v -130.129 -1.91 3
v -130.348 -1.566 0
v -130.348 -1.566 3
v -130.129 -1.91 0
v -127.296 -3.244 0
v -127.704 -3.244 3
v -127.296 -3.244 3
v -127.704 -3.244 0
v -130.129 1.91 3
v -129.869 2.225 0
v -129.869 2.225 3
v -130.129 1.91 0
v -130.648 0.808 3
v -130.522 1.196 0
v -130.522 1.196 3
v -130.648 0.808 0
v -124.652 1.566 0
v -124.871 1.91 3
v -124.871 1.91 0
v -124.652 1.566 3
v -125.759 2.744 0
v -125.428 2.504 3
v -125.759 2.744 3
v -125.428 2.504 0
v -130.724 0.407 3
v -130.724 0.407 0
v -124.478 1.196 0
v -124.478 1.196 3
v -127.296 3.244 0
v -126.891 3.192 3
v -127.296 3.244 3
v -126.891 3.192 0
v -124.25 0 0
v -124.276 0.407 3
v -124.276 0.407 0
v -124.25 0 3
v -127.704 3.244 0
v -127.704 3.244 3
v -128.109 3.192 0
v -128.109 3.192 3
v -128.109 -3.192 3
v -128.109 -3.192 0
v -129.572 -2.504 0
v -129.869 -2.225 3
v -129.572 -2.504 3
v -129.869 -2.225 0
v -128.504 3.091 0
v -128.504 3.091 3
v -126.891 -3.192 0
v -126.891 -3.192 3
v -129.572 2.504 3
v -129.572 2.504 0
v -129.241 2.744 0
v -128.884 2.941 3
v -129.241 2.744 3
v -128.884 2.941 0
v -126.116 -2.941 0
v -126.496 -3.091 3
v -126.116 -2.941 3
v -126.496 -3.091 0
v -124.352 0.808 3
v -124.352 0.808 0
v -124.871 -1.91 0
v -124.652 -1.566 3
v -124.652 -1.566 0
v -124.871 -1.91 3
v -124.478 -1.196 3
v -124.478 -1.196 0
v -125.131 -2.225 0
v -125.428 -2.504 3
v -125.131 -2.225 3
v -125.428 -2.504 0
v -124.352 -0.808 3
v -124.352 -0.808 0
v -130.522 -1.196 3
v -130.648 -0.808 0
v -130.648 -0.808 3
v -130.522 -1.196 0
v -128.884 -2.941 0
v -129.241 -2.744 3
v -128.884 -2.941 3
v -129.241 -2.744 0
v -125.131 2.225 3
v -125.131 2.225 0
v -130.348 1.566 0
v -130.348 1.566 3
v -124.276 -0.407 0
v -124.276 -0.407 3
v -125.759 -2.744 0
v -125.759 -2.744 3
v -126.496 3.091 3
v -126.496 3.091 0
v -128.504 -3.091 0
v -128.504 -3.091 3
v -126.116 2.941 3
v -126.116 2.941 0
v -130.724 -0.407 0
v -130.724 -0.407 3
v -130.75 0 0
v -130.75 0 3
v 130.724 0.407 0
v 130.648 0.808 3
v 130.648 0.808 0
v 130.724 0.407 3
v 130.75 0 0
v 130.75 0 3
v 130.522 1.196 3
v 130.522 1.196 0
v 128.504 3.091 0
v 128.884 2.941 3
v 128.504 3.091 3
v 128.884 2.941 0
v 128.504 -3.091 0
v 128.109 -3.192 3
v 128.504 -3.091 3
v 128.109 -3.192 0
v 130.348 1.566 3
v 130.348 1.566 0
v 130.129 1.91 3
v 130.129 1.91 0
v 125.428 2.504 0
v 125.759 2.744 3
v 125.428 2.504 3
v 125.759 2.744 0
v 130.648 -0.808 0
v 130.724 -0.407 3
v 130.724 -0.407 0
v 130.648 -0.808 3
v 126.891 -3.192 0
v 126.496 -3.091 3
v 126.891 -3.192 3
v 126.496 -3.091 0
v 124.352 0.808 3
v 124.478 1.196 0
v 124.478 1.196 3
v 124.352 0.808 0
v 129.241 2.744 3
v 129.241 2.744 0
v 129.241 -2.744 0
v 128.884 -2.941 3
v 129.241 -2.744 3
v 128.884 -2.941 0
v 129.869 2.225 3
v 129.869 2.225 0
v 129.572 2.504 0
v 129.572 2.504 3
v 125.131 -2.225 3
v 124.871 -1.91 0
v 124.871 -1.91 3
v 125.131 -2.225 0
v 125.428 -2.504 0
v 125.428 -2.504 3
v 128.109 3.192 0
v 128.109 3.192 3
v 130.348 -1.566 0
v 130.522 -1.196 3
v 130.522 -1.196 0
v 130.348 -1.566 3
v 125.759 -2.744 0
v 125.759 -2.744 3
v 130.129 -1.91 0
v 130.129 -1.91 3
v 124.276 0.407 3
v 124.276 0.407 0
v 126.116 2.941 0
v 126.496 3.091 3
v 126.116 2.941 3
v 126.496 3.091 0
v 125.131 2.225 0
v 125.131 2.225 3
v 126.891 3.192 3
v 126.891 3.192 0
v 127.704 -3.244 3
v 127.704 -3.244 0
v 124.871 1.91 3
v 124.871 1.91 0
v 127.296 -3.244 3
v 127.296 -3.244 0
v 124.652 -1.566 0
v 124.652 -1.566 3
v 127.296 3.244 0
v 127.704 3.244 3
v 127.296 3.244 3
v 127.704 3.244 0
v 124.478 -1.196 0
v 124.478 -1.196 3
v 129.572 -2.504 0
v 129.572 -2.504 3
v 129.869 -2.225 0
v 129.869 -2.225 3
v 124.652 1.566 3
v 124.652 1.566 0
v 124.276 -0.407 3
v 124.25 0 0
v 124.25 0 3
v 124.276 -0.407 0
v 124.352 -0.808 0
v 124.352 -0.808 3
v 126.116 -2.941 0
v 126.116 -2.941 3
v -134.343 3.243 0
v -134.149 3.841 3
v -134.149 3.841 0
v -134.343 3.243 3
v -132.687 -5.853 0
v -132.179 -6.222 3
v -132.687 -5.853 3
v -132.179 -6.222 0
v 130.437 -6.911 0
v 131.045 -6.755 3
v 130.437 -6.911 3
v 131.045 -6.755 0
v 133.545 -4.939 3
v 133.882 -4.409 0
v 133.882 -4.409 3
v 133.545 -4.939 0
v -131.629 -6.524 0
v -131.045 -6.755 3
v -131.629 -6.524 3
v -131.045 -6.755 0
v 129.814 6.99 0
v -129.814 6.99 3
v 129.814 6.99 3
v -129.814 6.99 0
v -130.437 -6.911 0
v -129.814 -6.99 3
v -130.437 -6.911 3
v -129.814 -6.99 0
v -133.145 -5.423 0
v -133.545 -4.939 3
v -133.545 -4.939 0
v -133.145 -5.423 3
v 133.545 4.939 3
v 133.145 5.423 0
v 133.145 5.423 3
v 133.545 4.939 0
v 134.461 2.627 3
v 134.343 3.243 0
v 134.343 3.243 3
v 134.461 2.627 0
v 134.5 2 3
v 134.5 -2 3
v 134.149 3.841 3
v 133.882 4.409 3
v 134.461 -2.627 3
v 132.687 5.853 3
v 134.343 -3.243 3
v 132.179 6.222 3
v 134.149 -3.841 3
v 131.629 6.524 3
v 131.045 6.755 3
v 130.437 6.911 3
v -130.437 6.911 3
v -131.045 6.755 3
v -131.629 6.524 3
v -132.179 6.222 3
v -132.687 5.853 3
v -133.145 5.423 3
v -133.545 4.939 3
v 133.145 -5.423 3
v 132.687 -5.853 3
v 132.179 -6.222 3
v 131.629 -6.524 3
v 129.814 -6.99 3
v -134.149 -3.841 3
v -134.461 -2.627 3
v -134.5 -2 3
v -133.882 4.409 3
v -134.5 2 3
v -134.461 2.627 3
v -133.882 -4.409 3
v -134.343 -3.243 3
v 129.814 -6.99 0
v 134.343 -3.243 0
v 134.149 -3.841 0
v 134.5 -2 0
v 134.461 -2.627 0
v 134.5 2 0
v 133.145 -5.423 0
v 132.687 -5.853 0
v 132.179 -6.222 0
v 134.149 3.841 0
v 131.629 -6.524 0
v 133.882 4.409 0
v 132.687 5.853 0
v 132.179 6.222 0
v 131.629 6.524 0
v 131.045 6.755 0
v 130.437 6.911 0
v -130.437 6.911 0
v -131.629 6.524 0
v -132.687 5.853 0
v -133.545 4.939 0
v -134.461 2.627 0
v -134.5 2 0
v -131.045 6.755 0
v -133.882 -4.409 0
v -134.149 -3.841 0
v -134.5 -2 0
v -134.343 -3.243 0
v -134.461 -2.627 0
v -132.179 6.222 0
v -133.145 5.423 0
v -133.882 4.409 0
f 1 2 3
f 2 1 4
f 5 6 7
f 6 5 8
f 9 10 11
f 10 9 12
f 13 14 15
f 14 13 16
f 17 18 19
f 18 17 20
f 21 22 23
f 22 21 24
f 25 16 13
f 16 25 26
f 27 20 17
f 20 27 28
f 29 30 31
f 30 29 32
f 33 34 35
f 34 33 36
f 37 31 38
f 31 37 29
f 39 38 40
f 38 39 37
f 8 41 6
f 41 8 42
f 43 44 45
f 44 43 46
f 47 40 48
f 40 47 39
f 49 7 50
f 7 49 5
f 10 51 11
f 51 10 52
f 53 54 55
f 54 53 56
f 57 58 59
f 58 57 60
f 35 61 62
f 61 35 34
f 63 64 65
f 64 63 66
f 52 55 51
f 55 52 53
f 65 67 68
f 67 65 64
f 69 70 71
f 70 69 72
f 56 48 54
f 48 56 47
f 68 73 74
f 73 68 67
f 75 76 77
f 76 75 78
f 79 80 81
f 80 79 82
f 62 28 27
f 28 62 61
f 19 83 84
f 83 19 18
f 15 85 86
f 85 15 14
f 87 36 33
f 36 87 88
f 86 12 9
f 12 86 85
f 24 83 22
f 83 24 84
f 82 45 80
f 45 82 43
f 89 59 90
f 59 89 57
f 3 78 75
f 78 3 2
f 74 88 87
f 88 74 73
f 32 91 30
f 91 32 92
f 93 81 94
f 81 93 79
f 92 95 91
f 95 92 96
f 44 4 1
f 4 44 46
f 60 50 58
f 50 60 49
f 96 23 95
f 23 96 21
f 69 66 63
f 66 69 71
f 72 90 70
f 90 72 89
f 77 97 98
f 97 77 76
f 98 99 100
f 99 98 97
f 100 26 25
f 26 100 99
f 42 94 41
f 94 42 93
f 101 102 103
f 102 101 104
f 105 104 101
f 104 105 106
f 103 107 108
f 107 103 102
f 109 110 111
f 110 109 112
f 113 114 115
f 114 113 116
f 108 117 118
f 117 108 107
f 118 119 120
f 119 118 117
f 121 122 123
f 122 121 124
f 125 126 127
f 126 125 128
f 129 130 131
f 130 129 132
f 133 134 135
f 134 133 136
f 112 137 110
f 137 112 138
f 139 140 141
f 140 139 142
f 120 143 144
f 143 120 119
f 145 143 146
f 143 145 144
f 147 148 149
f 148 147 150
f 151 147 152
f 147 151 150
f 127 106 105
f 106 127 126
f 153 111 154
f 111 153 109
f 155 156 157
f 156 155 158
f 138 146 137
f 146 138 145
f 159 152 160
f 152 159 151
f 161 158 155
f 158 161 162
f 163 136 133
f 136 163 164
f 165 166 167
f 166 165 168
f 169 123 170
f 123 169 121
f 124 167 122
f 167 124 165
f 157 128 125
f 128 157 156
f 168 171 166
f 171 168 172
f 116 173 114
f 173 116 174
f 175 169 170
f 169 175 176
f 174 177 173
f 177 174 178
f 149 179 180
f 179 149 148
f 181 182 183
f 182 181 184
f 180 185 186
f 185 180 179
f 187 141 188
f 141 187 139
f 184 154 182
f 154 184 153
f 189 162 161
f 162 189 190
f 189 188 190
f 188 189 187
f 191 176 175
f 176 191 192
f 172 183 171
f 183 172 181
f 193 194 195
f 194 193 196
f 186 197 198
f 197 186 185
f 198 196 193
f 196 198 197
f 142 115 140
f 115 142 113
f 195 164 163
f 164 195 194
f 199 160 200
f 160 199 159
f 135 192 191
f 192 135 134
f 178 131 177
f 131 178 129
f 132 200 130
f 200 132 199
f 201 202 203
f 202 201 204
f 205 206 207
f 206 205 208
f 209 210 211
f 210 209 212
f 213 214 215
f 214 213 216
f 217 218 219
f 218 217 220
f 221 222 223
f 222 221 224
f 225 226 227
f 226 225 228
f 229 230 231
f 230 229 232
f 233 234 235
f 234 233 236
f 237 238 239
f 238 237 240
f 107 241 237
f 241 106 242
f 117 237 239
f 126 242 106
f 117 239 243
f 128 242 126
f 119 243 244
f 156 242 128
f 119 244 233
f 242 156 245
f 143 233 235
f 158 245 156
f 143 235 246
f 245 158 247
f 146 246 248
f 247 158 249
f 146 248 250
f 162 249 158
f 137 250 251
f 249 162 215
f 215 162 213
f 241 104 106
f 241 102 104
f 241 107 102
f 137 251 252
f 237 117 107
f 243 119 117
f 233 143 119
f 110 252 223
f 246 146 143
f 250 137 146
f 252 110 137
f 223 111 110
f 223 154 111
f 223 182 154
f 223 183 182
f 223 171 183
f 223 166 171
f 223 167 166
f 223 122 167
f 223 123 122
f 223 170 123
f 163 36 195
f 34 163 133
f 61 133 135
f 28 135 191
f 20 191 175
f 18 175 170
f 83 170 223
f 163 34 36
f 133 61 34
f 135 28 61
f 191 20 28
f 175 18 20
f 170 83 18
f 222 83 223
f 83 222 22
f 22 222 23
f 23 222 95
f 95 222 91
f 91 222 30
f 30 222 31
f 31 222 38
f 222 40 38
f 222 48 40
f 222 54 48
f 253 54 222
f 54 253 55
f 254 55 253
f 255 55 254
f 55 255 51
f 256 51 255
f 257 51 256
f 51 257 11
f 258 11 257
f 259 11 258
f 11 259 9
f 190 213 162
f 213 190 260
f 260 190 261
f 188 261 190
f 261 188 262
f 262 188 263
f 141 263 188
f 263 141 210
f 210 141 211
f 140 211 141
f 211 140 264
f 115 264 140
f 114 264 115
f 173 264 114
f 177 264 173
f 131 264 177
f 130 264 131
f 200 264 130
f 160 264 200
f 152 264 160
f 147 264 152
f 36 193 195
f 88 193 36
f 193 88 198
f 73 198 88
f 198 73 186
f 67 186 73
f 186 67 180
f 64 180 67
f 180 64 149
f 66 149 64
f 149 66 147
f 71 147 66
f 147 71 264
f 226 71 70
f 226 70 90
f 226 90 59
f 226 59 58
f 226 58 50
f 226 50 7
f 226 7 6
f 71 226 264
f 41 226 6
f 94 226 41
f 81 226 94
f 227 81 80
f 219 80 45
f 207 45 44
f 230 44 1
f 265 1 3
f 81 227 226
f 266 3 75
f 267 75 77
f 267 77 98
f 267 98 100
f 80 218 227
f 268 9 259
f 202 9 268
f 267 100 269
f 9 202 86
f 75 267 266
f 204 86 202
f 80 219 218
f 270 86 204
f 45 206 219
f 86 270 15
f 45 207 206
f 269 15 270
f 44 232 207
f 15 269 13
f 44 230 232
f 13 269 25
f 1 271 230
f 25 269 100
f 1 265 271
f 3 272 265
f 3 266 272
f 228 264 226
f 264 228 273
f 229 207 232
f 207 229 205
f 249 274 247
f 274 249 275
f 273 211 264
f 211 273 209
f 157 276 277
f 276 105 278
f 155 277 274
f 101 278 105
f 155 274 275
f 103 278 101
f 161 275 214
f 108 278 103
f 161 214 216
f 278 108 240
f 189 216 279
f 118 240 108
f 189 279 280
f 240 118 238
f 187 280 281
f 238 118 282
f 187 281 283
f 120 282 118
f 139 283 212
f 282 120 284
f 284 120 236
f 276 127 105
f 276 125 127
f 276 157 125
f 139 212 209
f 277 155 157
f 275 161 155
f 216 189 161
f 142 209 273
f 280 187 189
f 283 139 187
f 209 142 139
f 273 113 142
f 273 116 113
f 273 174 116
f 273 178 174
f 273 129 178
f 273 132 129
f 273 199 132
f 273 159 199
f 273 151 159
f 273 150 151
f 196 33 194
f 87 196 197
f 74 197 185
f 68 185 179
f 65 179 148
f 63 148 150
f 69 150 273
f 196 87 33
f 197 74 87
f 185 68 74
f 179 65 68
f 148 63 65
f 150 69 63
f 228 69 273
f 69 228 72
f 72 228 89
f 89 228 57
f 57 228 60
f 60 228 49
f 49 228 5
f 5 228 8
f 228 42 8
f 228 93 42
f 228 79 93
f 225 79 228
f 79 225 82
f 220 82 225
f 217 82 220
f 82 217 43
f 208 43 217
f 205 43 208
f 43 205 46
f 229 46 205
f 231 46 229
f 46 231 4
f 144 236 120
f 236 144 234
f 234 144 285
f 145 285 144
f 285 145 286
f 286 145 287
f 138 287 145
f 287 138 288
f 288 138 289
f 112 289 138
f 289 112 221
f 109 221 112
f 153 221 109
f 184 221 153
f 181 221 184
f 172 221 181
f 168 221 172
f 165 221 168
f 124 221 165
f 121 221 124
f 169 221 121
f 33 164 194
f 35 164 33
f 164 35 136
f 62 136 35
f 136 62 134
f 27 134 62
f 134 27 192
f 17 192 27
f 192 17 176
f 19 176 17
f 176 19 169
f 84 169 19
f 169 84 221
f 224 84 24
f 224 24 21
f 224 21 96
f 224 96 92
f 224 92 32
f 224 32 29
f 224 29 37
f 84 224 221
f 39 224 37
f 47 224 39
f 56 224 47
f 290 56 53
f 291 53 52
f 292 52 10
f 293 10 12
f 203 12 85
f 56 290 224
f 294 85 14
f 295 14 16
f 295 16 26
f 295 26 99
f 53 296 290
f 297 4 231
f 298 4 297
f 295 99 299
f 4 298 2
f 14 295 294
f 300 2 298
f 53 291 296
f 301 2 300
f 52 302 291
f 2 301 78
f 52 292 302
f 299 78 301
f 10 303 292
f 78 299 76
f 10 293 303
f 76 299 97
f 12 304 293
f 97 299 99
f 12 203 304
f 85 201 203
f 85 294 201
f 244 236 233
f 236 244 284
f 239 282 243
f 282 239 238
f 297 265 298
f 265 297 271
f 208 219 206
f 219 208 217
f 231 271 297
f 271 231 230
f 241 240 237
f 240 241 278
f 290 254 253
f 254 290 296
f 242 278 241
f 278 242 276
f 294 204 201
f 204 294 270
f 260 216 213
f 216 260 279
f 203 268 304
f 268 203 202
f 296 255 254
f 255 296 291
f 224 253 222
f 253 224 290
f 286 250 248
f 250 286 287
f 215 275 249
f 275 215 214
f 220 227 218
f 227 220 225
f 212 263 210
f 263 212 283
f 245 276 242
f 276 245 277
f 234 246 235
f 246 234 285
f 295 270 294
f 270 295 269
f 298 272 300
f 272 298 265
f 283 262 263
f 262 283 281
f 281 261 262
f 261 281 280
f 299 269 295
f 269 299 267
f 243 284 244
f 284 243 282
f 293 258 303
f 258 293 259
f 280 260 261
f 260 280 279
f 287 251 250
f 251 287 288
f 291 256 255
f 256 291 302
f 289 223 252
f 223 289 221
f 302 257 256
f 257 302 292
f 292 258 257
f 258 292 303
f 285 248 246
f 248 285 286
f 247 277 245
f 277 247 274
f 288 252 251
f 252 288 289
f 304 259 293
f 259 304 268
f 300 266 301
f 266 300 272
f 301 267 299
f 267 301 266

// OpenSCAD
$fn = 50;


difference() {
	union() {
		hull() {
			translate(v = [-129.5000000000, 2.0000000000, 0]) {
				cylinder(h = 3, r = 5);
			}
			translate(v = [129.5000000000, 2.0000000000, 0]) {
				cylinder(h = 3, r = 5);
			}
			translate(v = [-129.5000000000, -2.0000000000, 0]) {
				cylinder(h = 3, r = 5);
			}
			translate(v = [129.5000000000, -2.0000000000, 0]) {
				cylinder(h = 3, r = 5);
			}
		}
	}
	union() {
		translate(v = [-127.5000000000, 0.0000000000, -100.0000000000]) {
			cylinder(h = 200, r = 3.2500000000);
		}
		translate(v = [-127.5000000000, 0.0000000000, -100.0000000000]) {
			cylinder(h = 200, r = 3.2500000000);
		}
		translate(v = [127.5000000000, 0.0000000000, -100.0000000000]) {
			cylinder(h = 200, r = 3.2500000000);
		}
		translate(v = [127.5000000000, 0.0000000000, -100.0000000000]) {
			cylinder(h = 200, r = 3.2500000000);
		}
	}
}
